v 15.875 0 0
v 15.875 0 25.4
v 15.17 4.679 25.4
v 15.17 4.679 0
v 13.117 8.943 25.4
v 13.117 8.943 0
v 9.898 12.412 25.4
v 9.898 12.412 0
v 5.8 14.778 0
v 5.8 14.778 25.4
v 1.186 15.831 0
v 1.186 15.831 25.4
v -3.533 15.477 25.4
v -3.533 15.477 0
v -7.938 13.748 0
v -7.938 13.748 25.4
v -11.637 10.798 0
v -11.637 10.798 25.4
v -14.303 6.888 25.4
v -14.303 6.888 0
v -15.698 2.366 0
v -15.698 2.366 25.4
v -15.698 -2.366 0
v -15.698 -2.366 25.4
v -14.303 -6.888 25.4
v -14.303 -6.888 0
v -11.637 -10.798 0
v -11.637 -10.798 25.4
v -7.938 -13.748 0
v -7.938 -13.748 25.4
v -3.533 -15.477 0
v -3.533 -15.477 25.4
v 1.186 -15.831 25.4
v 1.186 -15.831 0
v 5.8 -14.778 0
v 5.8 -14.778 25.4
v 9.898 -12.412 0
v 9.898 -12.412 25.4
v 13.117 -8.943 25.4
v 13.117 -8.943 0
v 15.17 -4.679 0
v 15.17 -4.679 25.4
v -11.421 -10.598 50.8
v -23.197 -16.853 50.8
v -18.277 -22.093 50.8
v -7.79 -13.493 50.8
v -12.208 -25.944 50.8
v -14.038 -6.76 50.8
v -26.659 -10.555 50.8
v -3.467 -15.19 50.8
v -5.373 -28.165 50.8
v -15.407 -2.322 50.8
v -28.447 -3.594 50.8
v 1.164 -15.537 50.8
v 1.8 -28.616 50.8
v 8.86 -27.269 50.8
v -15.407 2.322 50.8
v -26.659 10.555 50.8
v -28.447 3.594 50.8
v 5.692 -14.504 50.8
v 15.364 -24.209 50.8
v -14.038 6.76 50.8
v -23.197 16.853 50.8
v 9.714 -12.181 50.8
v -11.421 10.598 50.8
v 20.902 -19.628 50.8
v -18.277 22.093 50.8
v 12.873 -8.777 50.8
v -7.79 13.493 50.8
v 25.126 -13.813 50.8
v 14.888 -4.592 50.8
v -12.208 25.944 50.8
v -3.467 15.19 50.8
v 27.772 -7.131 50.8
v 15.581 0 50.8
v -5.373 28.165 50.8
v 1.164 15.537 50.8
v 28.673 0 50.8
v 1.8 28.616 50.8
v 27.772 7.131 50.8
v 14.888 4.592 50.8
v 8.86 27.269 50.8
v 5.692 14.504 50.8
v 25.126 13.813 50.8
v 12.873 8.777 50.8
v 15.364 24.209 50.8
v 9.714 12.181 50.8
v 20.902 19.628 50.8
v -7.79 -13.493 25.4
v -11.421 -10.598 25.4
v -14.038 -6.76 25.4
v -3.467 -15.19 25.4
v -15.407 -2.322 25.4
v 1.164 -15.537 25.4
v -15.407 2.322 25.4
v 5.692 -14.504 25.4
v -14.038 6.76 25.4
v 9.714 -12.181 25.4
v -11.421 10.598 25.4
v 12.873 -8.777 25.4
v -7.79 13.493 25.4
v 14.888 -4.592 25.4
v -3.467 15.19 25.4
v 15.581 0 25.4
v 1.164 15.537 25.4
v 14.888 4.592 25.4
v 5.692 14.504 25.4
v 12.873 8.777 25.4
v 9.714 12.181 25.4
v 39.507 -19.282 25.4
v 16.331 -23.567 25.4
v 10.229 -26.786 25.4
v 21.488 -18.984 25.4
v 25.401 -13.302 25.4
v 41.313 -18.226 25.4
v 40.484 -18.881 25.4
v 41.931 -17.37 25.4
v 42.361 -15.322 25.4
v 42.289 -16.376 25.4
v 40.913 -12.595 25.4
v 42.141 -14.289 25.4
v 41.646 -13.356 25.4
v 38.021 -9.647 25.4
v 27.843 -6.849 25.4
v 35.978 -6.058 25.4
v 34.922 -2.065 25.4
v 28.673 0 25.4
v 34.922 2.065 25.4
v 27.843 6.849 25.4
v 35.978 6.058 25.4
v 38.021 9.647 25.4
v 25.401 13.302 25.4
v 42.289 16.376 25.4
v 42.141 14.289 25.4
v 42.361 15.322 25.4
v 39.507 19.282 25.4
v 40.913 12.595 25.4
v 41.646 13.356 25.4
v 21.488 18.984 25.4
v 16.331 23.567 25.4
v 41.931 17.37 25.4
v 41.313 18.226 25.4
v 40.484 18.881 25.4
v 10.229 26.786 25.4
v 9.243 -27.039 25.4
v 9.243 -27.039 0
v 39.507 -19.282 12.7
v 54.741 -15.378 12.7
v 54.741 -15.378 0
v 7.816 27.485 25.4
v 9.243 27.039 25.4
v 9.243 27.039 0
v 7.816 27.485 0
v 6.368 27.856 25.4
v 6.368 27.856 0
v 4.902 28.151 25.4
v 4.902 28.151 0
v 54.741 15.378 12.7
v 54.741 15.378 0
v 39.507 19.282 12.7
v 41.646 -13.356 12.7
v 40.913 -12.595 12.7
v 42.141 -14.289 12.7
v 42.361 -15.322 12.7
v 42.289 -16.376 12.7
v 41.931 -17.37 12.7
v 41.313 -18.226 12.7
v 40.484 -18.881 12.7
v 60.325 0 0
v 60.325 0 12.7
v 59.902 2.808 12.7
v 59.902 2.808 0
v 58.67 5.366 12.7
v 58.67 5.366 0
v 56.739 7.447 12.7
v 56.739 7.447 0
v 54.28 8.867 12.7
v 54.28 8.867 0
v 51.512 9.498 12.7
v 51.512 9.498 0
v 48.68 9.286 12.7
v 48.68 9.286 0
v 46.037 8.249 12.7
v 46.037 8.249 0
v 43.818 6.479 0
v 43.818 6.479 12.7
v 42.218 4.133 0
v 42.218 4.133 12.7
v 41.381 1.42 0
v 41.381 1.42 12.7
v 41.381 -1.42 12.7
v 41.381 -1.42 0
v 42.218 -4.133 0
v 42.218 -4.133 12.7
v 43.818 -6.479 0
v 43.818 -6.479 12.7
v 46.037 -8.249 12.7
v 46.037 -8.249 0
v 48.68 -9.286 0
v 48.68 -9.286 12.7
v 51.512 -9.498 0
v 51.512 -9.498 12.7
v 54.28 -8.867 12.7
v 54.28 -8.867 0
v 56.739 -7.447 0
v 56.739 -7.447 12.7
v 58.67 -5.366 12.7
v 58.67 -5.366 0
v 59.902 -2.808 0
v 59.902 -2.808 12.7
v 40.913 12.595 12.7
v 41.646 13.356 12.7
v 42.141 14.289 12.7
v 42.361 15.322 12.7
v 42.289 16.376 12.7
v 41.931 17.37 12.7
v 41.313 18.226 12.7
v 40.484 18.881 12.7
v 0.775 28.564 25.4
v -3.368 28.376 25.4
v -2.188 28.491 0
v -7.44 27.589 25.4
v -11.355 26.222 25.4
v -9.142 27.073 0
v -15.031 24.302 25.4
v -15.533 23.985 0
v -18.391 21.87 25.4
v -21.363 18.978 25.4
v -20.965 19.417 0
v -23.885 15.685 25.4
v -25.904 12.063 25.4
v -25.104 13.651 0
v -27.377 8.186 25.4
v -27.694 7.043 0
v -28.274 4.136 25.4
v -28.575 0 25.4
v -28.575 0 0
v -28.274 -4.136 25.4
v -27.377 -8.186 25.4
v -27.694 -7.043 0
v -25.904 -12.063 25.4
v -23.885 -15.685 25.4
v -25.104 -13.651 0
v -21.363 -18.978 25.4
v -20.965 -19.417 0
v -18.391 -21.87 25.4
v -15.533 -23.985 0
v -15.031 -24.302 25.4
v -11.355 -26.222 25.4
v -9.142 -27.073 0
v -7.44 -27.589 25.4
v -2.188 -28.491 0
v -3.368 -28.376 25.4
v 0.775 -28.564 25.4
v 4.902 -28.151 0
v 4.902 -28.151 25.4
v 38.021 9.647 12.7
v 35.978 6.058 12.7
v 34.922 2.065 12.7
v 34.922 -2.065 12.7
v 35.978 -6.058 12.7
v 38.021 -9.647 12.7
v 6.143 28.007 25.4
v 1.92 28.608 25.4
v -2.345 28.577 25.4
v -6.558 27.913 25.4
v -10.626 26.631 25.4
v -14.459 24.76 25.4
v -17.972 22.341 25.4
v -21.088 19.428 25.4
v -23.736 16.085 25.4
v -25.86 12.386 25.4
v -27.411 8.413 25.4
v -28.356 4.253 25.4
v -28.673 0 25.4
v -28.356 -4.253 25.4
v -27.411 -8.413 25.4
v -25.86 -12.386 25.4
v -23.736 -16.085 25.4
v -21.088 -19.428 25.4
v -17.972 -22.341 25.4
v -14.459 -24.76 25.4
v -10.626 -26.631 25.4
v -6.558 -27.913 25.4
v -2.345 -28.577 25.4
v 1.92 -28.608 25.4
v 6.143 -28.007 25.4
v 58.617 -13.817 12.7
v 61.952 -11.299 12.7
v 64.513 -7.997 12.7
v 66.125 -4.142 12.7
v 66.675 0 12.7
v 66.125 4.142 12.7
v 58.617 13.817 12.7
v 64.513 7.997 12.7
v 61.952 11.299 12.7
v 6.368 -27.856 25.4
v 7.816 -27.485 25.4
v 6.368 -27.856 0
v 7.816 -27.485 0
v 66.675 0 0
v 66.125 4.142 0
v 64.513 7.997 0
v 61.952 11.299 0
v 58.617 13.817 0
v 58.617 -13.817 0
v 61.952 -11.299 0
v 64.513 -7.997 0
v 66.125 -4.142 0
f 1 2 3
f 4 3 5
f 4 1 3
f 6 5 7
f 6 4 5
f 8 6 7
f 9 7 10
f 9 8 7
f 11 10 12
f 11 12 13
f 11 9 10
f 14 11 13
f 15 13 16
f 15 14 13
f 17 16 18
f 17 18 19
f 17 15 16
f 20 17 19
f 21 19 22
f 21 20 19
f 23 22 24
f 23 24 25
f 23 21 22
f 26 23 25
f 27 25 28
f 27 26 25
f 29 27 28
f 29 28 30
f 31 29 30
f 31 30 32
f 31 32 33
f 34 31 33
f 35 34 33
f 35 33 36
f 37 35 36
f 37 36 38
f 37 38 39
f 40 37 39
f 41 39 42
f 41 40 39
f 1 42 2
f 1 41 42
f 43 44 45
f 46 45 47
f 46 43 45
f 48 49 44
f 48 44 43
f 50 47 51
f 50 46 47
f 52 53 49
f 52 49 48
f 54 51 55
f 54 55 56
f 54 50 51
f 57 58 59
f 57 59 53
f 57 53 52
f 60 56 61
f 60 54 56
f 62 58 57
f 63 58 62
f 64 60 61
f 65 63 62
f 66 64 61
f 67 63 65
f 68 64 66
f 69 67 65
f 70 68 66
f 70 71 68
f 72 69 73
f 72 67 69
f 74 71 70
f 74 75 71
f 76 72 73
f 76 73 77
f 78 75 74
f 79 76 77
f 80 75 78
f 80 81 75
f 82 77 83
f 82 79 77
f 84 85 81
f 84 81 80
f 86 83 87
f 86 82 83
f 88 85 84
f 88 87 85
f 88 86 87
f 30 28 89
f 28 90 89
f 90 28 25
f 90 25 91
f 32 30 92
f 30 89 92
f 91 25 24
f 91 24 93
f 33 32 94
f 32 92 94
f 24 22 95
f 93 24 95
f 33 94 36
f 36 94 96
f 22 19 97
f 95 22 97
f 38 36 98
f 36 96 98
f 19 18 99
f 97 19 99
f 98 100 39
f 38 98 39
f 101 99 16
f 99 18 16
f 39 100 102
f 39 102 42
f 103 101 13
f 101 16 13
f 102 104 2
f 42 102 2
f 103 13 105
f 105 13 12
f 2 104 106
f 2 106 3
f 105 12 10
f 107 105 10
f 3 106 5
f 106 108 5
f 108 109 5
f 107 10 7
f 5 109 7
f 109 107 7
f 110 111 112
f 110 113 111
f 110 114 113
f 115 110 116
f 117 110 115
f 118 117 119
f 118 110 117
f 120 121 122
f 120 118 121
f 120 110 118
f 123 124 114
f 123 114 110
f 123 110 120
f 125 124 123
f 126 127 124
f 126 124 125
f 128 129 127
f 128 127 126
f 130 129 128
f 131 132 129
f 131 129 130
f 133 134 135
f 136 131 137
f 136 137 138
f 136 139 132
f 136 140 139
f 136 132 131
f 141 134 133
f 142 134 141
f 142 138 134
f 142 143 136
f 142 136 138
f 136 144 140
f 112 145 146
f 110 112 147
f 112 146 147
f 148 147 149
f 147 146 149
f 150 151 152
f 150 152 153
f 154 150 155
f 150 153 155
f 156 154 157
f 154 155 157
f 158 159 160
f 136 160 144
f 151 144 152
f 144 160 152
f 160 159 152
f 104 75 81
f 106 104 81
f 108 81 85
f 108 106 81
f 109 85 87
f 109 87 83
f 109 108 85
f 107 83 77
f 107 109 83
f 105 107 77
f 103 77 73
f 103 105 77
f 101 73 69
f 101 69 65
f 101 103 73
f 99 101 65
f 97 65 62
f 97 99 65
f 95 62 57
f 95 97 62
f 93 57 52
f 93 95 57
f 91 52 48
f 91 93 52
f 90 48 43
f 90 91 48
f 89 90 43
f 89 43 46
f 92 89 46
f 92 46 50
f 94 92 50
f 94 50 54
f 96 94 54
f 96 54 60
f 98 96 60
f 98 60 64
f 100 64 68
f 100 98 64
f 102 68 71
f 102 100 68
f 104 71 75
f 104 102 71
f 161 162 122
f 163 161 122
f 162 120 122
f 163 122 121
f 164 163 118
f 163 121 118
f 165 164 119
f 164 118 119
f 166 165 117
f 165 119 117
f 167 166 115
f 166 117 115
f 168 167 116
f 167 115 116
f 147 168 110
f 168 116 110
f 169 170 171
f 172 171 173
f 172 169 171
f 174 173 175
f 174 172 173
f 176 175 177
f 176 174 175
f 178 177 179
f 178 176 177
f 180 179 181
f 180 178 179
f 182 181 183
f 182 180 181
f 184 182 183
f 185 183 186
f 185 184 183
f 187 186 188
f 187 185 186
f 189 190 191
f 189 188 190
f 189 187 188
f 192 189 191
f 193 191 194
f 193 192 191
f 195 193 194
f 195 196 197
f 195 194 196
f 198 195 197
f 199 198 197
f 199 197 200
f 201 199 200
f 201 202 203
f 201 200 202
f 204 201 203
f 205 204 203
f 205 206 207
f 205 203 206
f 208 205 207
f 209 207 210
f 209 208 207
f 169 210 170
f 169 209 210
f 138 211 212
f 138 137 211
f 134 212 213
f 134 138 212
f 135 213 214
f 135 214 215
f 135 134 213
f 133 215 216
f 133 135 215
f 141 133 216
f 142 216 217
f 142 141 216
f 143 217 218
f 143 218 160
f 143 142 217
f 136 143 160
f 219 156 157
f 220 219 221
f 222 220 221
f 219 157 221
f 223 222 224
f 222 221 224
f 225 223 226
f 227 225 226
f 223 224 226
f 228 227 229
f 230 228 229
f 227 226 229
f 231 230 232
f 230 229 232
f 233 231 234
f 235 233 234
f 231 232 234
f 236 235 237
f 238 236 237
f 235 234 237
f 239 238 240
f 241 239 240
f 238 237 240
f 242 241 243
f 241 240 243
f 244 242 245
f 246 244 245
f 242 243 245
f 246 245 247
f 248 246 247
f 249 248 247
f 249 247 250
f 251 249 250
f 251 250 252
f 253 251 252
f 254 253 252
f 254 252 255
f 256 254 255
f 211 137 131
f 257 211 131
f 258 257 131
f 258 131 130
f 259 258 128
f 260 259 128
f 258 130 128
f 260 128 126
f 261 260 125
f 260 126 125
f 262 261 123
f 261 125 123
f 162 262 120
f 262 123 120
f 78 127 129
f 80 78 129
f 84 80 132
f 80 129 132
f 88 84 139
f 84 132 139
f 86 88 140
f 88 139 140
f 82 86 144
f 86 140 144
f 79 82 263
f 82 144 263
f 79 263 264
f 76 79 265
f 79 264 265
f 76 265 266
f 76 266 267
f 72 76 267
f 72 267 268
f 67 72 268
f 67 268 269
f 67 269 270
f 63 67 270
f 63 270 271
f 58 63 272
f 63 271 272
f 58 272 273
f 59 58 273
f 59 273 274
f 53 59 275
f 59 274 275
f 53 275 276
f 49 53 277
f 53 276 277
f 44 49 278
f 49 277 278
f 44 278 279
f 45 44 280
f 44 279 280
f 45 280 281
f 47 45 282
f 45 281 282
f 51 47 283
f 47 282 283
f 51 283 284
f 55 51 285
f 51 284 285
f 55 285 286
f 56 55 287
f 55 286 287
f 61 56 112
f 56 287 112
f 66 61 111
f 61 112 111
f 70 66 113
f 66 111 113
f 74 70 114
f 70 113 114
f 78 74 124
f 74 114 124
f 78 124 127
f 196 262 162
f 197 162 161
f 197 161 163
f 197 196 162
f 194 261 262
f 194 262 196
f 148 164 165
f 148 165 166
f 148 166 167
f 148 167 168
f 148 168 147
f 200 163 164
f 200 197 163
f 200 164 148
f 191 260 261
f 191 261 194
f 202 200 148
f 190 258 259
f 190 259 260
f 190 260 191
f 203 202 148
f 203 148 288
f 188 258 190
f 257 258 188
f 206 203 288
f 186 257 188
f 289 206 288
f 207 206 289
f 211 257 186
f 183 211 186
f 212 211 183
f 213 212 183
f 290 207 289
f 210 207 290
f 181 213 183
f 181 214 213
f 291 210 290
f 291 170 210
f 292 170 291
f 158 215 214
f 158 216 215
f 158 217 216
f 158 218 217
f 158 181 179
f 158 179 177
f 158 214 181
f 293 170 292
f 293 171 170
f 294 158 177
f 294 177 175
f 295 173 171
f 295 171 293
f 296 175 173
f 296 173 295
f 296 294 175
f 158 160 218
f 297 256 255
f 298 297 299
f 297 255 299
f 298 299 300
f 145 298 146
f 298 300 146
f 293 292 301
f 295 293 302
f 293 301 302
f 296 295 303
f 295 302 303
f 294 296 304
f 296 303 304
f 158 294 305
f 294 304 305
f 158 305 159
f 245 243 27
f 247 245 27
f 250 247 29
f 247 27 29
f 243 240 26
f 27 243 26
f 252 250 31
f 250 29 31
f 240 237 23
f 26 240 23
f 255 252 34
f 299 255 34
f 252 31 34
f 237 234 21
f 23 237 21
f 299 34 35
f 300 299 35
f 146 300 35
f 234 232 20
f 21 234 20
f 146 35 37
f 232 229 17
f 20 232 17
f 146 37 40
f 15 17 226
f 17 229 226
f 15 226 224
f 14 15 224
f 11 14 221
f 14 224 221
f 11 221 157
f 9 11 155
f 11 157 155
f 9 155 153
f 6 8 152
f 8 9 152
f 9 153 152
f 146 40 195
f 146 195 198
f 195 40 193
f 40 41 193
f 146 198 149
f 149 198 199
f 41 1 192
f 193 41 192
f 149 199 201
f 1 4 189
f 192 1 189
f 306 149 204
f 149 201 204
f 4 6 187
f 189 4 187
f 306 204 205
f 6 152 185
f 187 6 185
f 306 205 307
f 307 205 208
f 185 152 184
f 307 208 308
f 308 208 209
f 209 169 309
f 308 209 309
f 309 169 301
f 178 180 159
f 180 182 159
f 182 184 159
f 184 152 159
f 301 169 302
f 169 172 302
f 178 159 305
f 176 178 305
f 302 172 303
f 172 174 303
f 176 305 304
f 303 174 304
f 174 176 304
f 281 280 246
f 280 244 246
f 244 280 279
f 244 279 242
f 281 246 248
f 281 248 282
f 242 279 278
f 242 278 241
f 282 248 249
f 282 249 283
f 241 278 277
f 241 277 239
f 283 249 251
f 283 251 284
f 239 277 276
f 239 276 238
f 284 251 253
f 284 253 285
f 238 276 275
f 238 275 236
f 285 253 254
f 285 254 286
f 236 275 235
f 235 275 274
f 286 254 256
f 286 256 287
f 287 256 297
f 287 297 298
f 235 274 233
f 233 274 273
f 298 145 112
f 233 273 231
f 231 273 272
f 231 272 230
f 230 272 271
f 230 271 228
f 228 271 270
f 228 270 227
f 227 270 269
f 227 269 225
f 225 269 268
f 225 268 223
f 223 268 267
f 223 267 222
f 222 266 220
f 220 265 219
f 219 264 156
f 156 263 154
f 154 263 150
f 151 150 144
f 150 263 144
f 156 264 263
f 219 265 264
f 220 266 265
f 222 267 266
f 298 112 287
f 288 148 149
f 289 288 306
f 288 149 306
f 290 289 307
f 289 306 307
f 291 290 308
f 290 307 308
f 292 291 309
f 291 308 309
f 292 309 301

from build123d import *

# Parameters (mm, degrees)
F0_R     = 15.875
F0_R_2   = 9.525
F1_DEPTH = 25.4
F2_R     = 28.672816
F2_R_2   = 15.580682
F3_DEPTH = 25.4
F4_R     = 16.011724
F4_R_2   = 9.452636
F5_DEPTH = 12.7
F6_R     = 3.81


with BuildPart() as f1:
    # F0 (on Top) → F1 (new body)
    with BuildSketch(Plane.XY):
        with BuildLine():
            Line((9.242882, 27.038856), (4.901954, 28.151403))
            ThreePointArc((4.901954, 28.151403), (-28.575, 0), (4.901954, -28.151403))
            Line((4.901954, -28.151403), (9.242882, -27.038856))
            ThreePointArc((9.242882, -27.038856), (23.244849, -16.619496), (28.575, 0))
            ThreePointArc((28.575, 0), (23.244849, 16.619496), (9.242882, 27.038856))
        make_face()
        Circle(F0_R, mode=Mode.SUBTRACT)
        with BuildLine():
            ThreePointArc((9.242882, 27.038856), (7.094261, 27.680356), (4.901954, 28.151403))
            Line((4.901954, 28.151403), (9.242882, 27.038856))
        make_face()
        with BuildLine():
            Line((9.242882, -27.038856), (4.901954, -28.151403))
            ThreePointArc((4.901954, -28.151403), (7.094261, -27.680356), (9.242882, -27.038856))
        make_face()
        with BuildLine():
            Line((54.741256, 15.377975), (9.242882, 27.038856))
            ThreePointArc((9.242882, 27.038856), (23.244849, 16.619496), (28.575, 0))
            Line((28.575, 0), (34.925, 0))
            ThreePointArc((34.925, 0), (41.06737, 12.541592), (54.741256, 15.377975))
        make_face()
        with BuildLine():
            ThreePointArc((28.575, 0), (23.244849, -16.619496), (9.242882, -27.038856))
            Line((9.242882, -27.038856), (54.741256, -15.377975))
            ThreePointArc((54.741256, -15.377975), (41.06737, -12.541592), (34.925, 0))
            Line((34.925, 0), (28.575, 0))
        make_face()
        with BuildLine():
            ThreePointArc((66.675, 0), (63.341592, 9.73263), (54.741256, 15.377975))
            ThreePointArc((54.741256, 15.377975), (41.06737, 12.541592), (34.925, 0))
            ThreePointArc((34.925, 0), (41.06737, -12.541592), (54.741256, -15.377975))
            ThreePointArc((54.741256, -15.377975), (63.341592, -9.73263), (66.675, 0))
        make_face()
        with Locations((50.8, 0)):
            Circle(F0_R_2, mode=Mode.SUBTRACT)
    extrude(amount=F1_DEPTH)

    # F2 (on face) → F3 (join)
    with BuildSketch(Plane.XY.offset(25.4)):
        Circle(F2_R)
        Circle(F2_R_2, mode=Mode.SUBTRACT)
    extrude(amount=F3_DEPTH)

    # F4 (on face) → F5 (cut)
    with BuildSketch(Plane.XY.offset(25.4)):
        with Locations((50.8, 0)):
            Circle(F4_R)
        with Locations((50.8, 0)):
            Circle(F4_R_2, mode=Mode.SUBTRACT)
    extrude(amount=-F5_DEPTH, mode=Mode.SUBTRACT)

    # F6
    f6_edges = [f1.edges().sort_by_distance(p)[0] for p in [
        (52.718644, -15.896355, 19.05),
        (52.718644, 15.896355, 19.05),
    ]]
    fillet(f6_edges, radius=F6_R)


solid = f1.part
